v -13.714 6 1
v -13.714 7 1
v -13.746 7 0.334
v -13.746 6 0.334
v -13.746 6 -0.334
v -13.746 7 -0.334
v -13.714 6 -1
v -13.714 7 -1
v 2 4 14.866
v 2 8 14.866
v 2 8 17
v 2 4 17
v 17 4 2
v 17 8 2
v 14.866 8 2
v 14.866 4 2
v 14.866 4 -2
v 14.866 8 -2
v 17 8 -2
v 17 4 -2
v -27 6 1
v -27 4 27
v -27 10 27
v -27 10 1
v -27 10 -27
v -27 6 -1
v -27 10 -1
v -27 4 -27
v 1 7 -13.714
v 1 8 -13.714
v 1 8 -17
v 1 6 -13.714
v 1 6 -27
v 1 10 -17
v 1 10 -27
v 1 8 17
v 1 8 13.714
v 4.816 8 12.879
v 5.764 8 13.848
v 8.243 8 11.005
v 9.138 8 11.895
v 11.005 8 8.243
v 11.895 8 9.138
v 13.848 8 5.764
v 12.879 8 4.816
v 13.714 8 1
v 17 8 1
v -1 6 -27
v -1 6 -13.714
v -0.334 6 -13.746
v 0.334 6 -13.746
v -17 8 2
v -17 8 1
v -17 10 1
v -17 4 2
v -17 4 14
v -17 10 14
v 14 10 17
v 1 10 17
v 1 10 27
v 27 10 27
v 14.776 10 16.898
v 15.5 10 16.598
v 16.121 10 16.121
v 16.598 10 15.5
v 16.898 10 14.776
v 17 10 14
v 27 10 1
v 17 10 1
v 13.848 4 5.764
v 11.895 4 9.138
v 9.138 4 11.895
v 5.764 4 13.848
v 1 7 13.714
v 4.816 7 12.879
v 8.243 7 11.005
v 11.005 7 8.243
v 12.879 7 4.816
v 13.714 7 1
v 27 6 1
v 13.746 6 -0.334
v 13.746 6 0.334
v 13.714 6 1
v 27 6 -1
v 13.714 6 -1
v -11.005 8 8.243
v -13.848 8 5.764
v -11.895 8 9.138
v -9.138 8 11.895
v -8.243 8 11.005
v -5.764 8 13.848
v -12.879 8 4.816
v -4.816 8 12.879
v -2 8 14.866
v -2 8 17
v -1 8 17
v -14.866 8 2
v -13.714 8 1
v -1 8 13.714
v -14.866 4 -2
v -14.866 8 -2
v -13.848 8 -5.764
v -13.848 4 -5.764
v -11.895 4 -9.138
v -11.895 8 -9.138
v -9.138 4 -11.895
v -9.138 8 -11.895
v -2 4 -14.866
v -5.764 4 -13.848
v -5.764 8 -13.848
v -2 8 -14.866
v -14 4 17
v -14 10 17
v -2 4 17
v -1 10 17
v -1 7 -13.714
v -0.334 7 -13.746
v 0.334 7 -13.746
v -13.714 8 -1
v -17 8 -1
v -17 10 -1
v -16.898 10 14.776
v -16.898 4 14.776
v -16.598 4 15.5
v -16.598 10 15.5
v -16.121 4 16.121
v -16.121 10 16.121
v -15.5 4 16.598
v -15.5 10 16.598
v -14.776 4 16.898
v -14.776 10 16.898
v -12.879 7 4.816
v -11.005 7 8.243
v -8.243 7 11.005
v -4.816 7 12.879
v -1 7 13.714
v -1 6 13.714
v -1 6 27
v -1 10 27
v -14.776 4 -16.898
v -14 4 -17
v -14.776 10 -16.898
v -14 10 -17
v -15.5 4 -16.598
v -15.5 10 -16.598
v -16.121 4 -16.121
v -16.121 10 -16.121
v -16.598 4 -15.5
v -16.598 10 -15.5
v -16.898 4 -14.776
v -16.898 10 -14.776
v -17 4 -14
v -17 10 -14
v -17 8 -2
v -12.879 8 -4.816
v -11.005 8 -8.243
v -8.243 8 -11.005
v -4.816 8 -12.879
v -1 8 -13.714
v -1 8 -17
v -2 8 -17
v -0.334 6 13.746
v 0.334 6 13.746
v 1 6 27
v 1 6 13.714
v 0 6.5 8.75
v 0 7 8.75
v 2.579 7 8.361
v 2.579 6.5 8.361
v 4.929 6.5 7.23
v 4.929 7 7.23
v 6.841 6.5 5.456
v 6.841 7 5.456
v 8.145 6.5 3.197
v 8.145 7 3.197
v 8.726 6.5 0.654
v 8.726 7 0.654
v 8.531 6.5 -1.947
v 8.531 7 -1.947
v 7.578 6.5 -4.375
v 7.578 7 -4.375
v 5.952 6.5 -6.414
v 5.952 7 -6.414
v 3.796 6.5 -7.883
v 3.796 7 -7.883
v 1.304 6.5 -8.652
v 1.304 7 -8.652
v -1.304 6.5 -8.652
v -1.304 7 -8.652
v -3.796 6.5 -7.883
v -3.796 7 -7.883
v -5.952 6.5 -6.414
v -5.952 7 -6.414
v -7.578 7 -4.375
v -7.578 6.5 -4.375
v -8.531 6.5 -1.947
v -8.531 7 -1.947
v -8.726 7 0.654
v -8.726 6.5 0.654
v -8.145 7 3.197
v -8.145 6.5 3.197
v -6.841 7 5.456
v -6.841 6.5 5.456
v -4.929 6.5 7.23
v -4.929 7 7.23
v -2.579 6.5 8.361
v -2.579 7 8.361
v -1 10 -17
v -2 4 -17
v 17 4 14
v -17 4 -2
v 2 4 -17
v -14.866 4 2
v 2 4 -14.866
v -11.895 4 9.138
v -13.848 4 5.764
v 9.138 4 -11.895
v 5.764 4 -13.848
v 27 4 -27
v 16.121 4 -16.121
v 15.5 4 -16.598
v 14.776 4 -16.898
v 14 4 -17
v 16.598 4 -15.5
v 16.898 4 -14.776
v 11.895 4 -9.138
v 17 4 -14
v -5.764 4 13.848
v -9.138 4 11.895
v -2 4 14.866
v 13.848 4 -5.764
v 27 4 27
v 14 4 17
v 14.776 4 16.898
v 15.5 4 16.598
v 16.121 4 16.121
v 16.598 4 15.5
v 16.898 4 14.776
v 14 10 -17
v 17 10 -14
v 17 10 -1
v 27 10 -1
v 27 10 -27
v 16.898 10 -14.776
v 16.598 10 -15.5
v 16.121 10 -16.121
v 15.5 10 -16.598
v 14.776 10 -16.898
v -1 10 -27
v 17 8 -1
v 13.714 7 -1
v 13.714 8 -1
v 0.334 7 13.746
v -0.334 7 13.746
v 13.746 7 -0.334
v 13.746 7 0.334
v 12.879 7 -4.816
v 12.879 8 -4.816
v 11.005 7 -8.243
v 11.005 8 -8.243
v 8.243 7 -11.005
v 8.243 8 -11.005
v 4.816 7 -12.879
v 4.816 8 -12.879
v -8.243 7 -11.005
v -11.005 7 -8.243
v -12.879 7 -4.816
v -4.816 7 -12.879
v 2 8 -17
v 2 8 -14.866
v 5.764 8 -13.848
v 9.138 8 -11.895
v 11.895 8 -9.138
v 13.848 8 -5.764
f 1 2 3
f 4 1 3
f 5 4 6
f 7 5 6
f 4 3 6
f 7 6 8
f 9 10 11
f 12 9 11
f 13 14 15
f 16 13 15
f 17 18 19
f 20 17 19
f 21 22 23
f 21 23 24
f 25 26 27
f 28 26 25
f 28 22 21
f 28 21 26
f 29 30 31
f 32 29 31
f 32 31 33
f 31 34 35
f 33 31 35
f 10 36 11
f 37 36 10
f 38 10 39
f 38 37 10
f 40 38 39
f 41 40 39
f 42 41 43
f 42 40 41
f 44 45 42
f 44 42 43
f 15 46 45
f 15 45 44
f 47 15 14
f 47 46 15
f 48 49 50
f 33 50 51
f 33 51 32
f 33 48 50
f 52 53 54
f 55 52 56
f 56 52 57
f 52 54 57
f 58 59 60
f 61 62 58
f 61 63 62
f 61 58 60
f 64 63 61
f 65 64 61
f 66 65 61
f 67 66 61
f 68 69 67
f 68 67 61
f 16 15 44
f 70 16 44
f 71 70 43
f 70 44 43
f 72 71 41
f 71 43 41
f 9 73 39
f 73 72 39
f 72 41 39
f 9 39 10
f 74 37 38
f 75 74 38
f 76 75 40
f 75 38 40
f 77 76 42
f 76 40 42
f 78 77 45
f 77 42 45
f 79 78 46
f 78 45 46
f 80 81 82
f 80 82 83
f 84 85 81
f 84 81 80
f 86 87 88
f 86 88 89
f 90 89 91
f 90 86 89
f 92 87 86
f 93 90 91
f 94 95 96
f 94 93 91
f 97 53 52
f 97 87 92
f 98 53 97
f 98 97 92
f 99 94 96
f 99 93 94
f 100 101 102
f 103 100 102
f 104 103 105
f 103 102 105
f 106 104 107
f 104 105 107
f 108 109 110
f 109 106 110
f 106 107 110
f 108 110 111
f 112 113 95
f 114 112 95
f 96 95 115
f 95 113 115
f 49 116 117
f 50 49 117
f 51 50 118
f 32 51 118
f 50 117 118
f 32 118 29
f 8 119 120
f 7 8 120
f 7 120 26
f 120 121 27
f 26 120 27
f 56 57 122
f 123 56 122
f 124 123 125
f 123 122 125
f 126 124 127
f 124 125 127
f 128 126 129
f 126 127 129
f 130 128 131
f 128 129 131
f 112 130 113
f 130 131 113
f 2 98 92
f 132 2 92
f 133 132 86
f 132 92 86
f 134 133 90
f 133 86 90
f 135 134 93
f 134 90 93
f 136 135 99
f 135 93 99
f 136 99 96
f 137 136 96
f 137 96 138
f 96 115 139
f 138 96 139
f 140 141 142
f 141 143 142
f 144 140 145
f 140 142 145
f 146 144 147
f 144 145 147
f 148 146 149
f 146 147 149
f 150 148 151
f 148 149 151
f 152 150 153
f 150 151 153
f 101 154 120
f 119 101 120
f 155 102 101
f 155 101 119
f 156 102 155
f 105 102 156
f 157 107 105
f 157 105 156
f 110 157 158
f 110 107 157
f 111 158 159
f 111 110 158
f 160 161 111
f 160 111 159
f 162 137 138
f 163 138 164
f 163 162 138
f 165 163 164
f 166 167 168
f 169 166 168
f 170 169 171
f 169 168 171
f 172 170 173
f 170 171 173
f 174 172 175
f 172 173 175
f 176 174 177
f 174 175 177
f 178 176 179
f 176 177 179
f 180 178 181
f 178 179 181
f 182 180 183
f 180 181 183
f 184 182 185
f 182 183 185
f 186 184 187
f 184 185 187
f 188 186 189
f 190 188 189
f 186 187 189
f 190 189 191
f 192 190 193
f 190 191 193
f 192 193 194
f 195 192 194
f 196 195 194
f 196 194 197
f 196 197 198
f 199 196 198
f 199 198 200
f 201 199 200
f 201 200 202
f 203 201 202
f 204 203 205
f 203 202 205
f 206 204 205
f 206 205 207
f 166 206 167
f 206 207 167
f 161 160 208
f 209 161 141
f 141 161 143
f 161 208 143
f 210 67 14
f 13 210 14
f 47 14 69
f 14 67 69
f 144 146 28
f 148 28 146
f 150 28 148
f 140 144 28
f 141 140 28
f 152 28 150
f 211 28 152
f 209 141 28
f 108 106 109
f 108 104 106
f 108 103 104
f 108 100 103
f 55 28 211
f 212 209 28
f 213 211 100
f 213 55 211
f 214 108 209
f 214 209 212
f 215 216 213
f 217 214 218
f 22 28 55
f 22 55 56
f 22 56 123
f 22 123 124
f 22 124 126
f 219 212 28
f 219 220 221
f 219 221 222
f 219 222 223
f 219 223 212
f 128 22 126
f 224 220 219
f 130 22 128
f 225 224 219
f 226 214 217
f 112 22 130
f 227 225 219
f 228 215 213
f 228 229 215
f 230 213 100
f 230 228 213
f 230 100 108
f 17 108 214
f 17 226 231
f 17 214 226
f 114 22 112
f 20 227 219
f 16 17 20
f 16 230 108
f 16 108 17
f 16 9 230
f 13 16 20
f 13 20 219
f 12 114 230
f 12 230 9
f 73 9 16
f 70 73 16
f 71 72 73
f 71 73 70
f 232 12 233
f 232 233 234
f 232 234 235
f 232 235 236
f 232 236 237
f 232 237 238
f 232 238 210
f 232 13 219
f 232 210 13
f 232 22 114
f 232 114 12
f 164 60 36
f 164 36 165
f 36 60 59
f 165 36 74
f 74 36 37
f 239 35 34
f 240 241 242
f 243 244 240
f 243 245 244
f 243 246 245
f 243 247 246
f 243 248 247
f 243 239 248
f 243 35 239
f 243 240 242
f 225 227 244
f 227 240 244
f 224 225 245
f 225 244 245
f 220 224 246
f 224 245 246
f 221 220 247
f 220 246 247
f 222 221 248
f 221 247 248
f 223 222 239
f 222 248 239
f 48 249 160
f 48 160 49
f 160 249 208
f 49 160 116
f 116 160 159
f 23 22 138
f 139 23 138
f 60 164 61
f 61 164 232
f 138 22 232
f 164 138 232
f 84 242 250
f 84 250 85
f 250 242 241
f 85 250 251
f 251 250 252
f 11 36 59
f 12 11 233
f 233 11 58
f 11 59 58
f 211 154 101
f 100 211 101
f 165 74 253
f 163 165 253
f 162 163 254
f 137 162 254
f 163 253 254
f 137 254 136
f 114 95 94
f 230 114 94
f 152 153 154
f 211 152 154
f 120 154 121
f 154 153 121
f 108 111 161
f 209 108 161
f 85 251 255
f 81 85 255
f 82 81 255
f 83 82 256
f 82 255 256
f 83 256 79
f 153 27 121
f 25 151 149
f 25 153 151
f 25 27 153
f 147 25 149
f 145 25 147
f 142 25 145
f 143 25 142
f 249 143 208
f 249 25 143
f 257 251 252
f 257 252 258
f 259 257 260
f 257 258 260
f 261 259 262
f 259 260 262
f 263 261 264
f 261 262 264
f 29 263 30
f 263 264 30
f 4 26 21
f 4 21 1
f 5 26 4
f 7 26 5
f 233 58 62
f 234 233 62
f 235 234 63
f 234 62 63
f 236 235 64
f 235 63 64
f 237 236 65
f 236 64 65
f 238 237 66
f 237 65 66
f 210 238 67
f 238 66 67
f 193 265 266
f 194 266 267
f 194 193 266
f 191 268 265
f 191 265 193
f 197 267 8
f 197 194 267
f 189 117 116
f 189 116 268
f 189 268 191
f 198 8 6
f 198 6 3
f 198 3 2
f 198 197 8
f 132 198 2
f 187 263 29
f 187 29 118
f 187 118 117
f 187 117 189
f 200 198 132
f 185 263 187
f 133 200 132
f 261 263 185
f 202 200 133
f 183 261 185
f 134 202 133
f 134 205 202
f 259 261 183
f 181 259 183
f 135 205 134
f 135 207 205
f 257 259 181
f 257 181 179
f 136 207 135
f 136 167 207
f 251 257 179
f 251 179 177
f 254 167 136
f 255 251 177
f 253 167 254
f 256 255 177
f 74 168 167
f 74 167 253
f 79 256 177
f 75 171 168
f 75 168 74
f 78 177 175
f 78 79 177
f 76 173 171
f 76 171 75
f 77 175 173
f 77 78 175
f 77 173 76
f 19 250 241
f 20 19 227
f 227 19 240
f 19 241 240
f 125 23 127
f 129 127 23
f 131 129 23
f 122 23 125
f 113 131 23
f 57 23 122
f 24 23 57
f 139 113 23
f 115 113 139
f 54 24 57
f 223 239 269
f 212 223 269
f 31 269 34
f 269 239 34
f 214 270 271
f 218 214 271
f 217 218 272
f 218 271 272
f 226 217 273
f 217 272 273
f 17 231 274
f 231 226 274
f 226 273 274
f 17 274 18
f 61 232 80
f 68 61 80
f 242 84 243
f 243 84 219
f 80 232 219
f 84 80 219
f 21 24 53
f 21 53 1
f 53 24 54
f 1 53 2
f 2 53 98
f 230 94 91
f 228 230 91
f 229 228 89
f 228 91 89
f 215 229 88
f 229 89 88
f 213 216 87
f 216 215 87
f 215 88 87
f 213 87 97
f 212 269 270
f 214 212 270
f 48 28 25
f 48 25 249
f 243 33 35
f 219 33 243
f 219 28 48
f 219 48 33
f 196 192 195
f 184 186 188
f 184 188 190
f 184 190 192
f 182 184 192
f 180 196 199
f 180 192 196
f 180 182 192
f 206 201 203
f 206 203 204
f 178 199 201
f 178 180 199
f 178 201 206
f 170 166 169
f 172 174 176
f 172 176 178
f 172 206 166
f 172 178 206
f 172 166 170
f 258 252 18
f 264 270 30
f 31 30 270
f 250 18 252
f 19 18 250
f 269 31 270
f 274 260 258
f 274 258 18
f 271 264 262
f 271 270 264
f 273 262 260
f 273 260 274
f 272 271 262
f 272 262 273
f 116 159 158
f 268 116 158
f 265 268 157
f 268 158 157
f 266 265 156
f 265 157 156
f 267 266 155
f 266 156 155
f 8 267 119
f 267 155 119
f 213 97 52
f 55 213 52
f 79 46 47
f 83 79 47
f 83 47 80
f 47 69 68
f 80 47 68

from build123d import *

# Parameters (mm, degrees)
SKETCH1_W             = 54
SKETCH1_H             = 54
BOSS_EXTRUDE1_DEPTH   = 10
CUT_EXTRUDE2_DEPTH    = 40.471508712
CUT_EXTRUDE3_DEPTH    = 2
SKETCH4_R             = 13.75
CUT_EXTRUDE4_DEPTH    = 1
SKETCH5_W             = 2
SKETCH5_H             = 10
SKETCH5_W_2           = 10
SKETCH5_H_2           = 2
CUT_EXTRUDE5_DEPTH    = 4
SKETCH7_R             = 8.75
CUT_EXTRUDE7_DEPTH    = 0.5
CROQUIS1_W            = 54
CROQUIS1_H            = 54
CORTAR_EXTRUIR1_DEPTH = 4


with BuildPart() as part:
    # Sketch1 → Boss-Extrude1 (new body)
    with BuildSketch(Plane(origin=(0, 0, 0), x_dir=(1, 0, 0), z_dir=(0, 1, 0))):
        Rectangle(SKETCH1_W, SKETCH1_H)
    extrude(amount=BOSS_EXTRUDE1_DEPTH)

    # Sketch2 → Cut-Extrude2 (cut, through all)
    with BuildSketch(Plane(origin=(0, 10, 0), x_dir=(1, 0, 0), z_dir=(0, 1, 0))):
        with BuildLine():
            ThreePointArc((-17, -14), (-16.121320344, -16.121320344), (-14, -17))
            Line((-14, -17), (-2, -17))
            Line((-2, -17), (-2, -14.866068747))
            ThreePointArc((-2, -14.866068747), (-10.606601718, -10.606601718), (-14.866068747, -2))
            Line((-14.866068747, -2), (-17, -2))
            Line((-17, -2), (-17, -14))
        make_face()
        with BuildLine():
            Line((2, -14.866068747), (2, -17))
            Line((2, -17), (14, -17))
            ThreePointArc((14, -17), (16.121320344, -16.121320344), (17, -14))
            Line((17, -14), (17, -2))
            Line((17, -2), (14.866068747, -2))
            ThreePointArc((14.866068747, -2), (10.606601718, -10.606601718), (2, -14.866068747))
        make_face()
        with BuildLine():
            Line((-17, 14), (-17, 2))
            Line((-17, 2), (-14.866068747, 2))
            ThreePointArc((-14.866068747, 2), (-10.606601718, 10.606601718), (-2, 14.866068747))
            Line((-2, 14.866068747), (-2, 17))
            Line((-2, 17), (-14, 17))
            ThreePointArc((-14, 17), (-16.121320344, 16.121320344), (-17, 14))
        make_face()
        with BuildLine():
            Line((14.866068747, 2), (17, 2))
            Line((17, 2), (17, 14))
            ThreePointArc((17, 14), (16.121320344, 16.121320344), (14, 17))
            Line((14, 17), (2, 17))
            Line((2, 17), (2, 14.866068747))
            ThreePointArc((2, 14.866068747), (10.606601718, 10.606601718), (14.866068747, 2))
        make_face()
    extrude(amount=-CUT_EXTRUDE2_DEPTH, mode=Mode.SUBTRACT)

    # Sketch3 → Cut-Extrude3 (cut)
    with BuildSketch(Plane(origin=(0, 10, 0), x_dir=(1, 0, 0), z_dir=(0, 1, 0))):
        with BuildLine():
            Line((-14, -17), (14, -17))
            ThreePointArc((14, -17), (16.121320344, -16.121320344), (17, -14))
            Line((17, -14), (17, 14))
            ThreePointArc((17, 14), (16.121320344, 16.121320344), (14, 17))
            Line((14, 17), (-14, 17))
            ThreePointArc((-14, 17), (-16.121320344, 16.121320344), (-17, 14))
            Line((-17, 14), (-17, -14))
            ThreePointArc((-17, -14), (-16.121320344, -16.121320344), (-14, -17))
        make_face()
    extrude(amount=-CUT_EXTRUDE3_DEPTH, mode=Mode.SUBTRACT)

    # Sketch4 → Cut-Extrude4 (cut)
    with BuildSketch(Plane(origin=(0, 8, 0), x_dir=(1, 0, 0), z_dir=(0, 1, 0))):
        with Locations(Location((0, 0, 0), (0, 0, 270))):
            Circle(SKETCH4_R)
    extrude(amount=-CUT_EXTRUDE4_DEPTH, mode=Mode.SUBTRACT)

    # Sketch5 → Cut-Extrude5 (cut)
    with BuildSketch(Plane(origin=(0, 10, 0), x_dir=(1, 0, 0), z_dir=(0, 1, 0))):
        with Locations((0, -22)):
            Rectangle(SKETCH5_W, SKETCH5_H)
        with BuildLine():
            Line((1, -17), (1, -13.713588152))
            ThreePointArc((1, -13.713588152), (0, -13.75), (-1, -13.713588152))
            Line((-1, -13.713588152), (-1, -17))
            Line((-1, -17), (1, -17))
        make_face()
        with Locations((22, 0)):
            Rectangle(SKETCH5_W_2, SKETCH5_H_2)
        with BuildLine():
            Line((17, 1), (13.713588152, 1))
            ThreePointArc((13.713588152, 1), (13.75, 0), (13.713588152, -1))
            Line((13.713588152, -1), (17, -1))
            Line((17, -1), (17, 1))
        make_face()
        with BuildLine():
            Line((1, 17), (-1, 17))
            Line((-1, 17), (-1, 13.713588152))
            ThreePointArc((-1, 13.713588152), (0, 13.75), (1, 13.713588152))
            Line((1, 13.713588152), (1, 17))
        make_face()
        with Locations((0, 22)):
            Rectangle(SKETCH5_W, SKETCH5_H)
        with Locations((-22, 0)):
            Rectangle(SKETCH5_W_2, SKETCH5_H_2)
        with BuildLine():
            Line((-13.713588152, 1), (-17, 1))
            Line((-17, 1), (-17, -1))
            Line((-17, -1), (-13.713588152, -1))
            ThreePointArc((-13.713588152, -1), (-13.75, 0), (-13.713588152, 1))
        make_face()
    extrude(amount=-CUT_EXTRUDE5_DEPTH, mode=Mode.SUBTRACT)

    # Sketch7 → Cut-Extrude7 (cut)
    with BuildSketch(Plane(origin=(0, 7, 0), x_dir=(1, 0, 0), z_dir=(0, 1, 0))):
        with Locations(Location((0, 0, 0), (0, 0, 270))):
            Circle(SKETCH7_R)
    extrude(amount=-CUT_EXTRUDE7_DEPTH, mode=Mode.SUBTRACT)

    # Croquis1 → Cortar-Extruir1 (cut)
    with BuildSketch(Plane.XZ):
        Rectangle(CROQUIS1_W, CROQUIS1_H)
    extrude(amount=-CORTAR_EXTRUIR1_DEPTH, mode=Mode.SUBTRACT)


solid = part.part
